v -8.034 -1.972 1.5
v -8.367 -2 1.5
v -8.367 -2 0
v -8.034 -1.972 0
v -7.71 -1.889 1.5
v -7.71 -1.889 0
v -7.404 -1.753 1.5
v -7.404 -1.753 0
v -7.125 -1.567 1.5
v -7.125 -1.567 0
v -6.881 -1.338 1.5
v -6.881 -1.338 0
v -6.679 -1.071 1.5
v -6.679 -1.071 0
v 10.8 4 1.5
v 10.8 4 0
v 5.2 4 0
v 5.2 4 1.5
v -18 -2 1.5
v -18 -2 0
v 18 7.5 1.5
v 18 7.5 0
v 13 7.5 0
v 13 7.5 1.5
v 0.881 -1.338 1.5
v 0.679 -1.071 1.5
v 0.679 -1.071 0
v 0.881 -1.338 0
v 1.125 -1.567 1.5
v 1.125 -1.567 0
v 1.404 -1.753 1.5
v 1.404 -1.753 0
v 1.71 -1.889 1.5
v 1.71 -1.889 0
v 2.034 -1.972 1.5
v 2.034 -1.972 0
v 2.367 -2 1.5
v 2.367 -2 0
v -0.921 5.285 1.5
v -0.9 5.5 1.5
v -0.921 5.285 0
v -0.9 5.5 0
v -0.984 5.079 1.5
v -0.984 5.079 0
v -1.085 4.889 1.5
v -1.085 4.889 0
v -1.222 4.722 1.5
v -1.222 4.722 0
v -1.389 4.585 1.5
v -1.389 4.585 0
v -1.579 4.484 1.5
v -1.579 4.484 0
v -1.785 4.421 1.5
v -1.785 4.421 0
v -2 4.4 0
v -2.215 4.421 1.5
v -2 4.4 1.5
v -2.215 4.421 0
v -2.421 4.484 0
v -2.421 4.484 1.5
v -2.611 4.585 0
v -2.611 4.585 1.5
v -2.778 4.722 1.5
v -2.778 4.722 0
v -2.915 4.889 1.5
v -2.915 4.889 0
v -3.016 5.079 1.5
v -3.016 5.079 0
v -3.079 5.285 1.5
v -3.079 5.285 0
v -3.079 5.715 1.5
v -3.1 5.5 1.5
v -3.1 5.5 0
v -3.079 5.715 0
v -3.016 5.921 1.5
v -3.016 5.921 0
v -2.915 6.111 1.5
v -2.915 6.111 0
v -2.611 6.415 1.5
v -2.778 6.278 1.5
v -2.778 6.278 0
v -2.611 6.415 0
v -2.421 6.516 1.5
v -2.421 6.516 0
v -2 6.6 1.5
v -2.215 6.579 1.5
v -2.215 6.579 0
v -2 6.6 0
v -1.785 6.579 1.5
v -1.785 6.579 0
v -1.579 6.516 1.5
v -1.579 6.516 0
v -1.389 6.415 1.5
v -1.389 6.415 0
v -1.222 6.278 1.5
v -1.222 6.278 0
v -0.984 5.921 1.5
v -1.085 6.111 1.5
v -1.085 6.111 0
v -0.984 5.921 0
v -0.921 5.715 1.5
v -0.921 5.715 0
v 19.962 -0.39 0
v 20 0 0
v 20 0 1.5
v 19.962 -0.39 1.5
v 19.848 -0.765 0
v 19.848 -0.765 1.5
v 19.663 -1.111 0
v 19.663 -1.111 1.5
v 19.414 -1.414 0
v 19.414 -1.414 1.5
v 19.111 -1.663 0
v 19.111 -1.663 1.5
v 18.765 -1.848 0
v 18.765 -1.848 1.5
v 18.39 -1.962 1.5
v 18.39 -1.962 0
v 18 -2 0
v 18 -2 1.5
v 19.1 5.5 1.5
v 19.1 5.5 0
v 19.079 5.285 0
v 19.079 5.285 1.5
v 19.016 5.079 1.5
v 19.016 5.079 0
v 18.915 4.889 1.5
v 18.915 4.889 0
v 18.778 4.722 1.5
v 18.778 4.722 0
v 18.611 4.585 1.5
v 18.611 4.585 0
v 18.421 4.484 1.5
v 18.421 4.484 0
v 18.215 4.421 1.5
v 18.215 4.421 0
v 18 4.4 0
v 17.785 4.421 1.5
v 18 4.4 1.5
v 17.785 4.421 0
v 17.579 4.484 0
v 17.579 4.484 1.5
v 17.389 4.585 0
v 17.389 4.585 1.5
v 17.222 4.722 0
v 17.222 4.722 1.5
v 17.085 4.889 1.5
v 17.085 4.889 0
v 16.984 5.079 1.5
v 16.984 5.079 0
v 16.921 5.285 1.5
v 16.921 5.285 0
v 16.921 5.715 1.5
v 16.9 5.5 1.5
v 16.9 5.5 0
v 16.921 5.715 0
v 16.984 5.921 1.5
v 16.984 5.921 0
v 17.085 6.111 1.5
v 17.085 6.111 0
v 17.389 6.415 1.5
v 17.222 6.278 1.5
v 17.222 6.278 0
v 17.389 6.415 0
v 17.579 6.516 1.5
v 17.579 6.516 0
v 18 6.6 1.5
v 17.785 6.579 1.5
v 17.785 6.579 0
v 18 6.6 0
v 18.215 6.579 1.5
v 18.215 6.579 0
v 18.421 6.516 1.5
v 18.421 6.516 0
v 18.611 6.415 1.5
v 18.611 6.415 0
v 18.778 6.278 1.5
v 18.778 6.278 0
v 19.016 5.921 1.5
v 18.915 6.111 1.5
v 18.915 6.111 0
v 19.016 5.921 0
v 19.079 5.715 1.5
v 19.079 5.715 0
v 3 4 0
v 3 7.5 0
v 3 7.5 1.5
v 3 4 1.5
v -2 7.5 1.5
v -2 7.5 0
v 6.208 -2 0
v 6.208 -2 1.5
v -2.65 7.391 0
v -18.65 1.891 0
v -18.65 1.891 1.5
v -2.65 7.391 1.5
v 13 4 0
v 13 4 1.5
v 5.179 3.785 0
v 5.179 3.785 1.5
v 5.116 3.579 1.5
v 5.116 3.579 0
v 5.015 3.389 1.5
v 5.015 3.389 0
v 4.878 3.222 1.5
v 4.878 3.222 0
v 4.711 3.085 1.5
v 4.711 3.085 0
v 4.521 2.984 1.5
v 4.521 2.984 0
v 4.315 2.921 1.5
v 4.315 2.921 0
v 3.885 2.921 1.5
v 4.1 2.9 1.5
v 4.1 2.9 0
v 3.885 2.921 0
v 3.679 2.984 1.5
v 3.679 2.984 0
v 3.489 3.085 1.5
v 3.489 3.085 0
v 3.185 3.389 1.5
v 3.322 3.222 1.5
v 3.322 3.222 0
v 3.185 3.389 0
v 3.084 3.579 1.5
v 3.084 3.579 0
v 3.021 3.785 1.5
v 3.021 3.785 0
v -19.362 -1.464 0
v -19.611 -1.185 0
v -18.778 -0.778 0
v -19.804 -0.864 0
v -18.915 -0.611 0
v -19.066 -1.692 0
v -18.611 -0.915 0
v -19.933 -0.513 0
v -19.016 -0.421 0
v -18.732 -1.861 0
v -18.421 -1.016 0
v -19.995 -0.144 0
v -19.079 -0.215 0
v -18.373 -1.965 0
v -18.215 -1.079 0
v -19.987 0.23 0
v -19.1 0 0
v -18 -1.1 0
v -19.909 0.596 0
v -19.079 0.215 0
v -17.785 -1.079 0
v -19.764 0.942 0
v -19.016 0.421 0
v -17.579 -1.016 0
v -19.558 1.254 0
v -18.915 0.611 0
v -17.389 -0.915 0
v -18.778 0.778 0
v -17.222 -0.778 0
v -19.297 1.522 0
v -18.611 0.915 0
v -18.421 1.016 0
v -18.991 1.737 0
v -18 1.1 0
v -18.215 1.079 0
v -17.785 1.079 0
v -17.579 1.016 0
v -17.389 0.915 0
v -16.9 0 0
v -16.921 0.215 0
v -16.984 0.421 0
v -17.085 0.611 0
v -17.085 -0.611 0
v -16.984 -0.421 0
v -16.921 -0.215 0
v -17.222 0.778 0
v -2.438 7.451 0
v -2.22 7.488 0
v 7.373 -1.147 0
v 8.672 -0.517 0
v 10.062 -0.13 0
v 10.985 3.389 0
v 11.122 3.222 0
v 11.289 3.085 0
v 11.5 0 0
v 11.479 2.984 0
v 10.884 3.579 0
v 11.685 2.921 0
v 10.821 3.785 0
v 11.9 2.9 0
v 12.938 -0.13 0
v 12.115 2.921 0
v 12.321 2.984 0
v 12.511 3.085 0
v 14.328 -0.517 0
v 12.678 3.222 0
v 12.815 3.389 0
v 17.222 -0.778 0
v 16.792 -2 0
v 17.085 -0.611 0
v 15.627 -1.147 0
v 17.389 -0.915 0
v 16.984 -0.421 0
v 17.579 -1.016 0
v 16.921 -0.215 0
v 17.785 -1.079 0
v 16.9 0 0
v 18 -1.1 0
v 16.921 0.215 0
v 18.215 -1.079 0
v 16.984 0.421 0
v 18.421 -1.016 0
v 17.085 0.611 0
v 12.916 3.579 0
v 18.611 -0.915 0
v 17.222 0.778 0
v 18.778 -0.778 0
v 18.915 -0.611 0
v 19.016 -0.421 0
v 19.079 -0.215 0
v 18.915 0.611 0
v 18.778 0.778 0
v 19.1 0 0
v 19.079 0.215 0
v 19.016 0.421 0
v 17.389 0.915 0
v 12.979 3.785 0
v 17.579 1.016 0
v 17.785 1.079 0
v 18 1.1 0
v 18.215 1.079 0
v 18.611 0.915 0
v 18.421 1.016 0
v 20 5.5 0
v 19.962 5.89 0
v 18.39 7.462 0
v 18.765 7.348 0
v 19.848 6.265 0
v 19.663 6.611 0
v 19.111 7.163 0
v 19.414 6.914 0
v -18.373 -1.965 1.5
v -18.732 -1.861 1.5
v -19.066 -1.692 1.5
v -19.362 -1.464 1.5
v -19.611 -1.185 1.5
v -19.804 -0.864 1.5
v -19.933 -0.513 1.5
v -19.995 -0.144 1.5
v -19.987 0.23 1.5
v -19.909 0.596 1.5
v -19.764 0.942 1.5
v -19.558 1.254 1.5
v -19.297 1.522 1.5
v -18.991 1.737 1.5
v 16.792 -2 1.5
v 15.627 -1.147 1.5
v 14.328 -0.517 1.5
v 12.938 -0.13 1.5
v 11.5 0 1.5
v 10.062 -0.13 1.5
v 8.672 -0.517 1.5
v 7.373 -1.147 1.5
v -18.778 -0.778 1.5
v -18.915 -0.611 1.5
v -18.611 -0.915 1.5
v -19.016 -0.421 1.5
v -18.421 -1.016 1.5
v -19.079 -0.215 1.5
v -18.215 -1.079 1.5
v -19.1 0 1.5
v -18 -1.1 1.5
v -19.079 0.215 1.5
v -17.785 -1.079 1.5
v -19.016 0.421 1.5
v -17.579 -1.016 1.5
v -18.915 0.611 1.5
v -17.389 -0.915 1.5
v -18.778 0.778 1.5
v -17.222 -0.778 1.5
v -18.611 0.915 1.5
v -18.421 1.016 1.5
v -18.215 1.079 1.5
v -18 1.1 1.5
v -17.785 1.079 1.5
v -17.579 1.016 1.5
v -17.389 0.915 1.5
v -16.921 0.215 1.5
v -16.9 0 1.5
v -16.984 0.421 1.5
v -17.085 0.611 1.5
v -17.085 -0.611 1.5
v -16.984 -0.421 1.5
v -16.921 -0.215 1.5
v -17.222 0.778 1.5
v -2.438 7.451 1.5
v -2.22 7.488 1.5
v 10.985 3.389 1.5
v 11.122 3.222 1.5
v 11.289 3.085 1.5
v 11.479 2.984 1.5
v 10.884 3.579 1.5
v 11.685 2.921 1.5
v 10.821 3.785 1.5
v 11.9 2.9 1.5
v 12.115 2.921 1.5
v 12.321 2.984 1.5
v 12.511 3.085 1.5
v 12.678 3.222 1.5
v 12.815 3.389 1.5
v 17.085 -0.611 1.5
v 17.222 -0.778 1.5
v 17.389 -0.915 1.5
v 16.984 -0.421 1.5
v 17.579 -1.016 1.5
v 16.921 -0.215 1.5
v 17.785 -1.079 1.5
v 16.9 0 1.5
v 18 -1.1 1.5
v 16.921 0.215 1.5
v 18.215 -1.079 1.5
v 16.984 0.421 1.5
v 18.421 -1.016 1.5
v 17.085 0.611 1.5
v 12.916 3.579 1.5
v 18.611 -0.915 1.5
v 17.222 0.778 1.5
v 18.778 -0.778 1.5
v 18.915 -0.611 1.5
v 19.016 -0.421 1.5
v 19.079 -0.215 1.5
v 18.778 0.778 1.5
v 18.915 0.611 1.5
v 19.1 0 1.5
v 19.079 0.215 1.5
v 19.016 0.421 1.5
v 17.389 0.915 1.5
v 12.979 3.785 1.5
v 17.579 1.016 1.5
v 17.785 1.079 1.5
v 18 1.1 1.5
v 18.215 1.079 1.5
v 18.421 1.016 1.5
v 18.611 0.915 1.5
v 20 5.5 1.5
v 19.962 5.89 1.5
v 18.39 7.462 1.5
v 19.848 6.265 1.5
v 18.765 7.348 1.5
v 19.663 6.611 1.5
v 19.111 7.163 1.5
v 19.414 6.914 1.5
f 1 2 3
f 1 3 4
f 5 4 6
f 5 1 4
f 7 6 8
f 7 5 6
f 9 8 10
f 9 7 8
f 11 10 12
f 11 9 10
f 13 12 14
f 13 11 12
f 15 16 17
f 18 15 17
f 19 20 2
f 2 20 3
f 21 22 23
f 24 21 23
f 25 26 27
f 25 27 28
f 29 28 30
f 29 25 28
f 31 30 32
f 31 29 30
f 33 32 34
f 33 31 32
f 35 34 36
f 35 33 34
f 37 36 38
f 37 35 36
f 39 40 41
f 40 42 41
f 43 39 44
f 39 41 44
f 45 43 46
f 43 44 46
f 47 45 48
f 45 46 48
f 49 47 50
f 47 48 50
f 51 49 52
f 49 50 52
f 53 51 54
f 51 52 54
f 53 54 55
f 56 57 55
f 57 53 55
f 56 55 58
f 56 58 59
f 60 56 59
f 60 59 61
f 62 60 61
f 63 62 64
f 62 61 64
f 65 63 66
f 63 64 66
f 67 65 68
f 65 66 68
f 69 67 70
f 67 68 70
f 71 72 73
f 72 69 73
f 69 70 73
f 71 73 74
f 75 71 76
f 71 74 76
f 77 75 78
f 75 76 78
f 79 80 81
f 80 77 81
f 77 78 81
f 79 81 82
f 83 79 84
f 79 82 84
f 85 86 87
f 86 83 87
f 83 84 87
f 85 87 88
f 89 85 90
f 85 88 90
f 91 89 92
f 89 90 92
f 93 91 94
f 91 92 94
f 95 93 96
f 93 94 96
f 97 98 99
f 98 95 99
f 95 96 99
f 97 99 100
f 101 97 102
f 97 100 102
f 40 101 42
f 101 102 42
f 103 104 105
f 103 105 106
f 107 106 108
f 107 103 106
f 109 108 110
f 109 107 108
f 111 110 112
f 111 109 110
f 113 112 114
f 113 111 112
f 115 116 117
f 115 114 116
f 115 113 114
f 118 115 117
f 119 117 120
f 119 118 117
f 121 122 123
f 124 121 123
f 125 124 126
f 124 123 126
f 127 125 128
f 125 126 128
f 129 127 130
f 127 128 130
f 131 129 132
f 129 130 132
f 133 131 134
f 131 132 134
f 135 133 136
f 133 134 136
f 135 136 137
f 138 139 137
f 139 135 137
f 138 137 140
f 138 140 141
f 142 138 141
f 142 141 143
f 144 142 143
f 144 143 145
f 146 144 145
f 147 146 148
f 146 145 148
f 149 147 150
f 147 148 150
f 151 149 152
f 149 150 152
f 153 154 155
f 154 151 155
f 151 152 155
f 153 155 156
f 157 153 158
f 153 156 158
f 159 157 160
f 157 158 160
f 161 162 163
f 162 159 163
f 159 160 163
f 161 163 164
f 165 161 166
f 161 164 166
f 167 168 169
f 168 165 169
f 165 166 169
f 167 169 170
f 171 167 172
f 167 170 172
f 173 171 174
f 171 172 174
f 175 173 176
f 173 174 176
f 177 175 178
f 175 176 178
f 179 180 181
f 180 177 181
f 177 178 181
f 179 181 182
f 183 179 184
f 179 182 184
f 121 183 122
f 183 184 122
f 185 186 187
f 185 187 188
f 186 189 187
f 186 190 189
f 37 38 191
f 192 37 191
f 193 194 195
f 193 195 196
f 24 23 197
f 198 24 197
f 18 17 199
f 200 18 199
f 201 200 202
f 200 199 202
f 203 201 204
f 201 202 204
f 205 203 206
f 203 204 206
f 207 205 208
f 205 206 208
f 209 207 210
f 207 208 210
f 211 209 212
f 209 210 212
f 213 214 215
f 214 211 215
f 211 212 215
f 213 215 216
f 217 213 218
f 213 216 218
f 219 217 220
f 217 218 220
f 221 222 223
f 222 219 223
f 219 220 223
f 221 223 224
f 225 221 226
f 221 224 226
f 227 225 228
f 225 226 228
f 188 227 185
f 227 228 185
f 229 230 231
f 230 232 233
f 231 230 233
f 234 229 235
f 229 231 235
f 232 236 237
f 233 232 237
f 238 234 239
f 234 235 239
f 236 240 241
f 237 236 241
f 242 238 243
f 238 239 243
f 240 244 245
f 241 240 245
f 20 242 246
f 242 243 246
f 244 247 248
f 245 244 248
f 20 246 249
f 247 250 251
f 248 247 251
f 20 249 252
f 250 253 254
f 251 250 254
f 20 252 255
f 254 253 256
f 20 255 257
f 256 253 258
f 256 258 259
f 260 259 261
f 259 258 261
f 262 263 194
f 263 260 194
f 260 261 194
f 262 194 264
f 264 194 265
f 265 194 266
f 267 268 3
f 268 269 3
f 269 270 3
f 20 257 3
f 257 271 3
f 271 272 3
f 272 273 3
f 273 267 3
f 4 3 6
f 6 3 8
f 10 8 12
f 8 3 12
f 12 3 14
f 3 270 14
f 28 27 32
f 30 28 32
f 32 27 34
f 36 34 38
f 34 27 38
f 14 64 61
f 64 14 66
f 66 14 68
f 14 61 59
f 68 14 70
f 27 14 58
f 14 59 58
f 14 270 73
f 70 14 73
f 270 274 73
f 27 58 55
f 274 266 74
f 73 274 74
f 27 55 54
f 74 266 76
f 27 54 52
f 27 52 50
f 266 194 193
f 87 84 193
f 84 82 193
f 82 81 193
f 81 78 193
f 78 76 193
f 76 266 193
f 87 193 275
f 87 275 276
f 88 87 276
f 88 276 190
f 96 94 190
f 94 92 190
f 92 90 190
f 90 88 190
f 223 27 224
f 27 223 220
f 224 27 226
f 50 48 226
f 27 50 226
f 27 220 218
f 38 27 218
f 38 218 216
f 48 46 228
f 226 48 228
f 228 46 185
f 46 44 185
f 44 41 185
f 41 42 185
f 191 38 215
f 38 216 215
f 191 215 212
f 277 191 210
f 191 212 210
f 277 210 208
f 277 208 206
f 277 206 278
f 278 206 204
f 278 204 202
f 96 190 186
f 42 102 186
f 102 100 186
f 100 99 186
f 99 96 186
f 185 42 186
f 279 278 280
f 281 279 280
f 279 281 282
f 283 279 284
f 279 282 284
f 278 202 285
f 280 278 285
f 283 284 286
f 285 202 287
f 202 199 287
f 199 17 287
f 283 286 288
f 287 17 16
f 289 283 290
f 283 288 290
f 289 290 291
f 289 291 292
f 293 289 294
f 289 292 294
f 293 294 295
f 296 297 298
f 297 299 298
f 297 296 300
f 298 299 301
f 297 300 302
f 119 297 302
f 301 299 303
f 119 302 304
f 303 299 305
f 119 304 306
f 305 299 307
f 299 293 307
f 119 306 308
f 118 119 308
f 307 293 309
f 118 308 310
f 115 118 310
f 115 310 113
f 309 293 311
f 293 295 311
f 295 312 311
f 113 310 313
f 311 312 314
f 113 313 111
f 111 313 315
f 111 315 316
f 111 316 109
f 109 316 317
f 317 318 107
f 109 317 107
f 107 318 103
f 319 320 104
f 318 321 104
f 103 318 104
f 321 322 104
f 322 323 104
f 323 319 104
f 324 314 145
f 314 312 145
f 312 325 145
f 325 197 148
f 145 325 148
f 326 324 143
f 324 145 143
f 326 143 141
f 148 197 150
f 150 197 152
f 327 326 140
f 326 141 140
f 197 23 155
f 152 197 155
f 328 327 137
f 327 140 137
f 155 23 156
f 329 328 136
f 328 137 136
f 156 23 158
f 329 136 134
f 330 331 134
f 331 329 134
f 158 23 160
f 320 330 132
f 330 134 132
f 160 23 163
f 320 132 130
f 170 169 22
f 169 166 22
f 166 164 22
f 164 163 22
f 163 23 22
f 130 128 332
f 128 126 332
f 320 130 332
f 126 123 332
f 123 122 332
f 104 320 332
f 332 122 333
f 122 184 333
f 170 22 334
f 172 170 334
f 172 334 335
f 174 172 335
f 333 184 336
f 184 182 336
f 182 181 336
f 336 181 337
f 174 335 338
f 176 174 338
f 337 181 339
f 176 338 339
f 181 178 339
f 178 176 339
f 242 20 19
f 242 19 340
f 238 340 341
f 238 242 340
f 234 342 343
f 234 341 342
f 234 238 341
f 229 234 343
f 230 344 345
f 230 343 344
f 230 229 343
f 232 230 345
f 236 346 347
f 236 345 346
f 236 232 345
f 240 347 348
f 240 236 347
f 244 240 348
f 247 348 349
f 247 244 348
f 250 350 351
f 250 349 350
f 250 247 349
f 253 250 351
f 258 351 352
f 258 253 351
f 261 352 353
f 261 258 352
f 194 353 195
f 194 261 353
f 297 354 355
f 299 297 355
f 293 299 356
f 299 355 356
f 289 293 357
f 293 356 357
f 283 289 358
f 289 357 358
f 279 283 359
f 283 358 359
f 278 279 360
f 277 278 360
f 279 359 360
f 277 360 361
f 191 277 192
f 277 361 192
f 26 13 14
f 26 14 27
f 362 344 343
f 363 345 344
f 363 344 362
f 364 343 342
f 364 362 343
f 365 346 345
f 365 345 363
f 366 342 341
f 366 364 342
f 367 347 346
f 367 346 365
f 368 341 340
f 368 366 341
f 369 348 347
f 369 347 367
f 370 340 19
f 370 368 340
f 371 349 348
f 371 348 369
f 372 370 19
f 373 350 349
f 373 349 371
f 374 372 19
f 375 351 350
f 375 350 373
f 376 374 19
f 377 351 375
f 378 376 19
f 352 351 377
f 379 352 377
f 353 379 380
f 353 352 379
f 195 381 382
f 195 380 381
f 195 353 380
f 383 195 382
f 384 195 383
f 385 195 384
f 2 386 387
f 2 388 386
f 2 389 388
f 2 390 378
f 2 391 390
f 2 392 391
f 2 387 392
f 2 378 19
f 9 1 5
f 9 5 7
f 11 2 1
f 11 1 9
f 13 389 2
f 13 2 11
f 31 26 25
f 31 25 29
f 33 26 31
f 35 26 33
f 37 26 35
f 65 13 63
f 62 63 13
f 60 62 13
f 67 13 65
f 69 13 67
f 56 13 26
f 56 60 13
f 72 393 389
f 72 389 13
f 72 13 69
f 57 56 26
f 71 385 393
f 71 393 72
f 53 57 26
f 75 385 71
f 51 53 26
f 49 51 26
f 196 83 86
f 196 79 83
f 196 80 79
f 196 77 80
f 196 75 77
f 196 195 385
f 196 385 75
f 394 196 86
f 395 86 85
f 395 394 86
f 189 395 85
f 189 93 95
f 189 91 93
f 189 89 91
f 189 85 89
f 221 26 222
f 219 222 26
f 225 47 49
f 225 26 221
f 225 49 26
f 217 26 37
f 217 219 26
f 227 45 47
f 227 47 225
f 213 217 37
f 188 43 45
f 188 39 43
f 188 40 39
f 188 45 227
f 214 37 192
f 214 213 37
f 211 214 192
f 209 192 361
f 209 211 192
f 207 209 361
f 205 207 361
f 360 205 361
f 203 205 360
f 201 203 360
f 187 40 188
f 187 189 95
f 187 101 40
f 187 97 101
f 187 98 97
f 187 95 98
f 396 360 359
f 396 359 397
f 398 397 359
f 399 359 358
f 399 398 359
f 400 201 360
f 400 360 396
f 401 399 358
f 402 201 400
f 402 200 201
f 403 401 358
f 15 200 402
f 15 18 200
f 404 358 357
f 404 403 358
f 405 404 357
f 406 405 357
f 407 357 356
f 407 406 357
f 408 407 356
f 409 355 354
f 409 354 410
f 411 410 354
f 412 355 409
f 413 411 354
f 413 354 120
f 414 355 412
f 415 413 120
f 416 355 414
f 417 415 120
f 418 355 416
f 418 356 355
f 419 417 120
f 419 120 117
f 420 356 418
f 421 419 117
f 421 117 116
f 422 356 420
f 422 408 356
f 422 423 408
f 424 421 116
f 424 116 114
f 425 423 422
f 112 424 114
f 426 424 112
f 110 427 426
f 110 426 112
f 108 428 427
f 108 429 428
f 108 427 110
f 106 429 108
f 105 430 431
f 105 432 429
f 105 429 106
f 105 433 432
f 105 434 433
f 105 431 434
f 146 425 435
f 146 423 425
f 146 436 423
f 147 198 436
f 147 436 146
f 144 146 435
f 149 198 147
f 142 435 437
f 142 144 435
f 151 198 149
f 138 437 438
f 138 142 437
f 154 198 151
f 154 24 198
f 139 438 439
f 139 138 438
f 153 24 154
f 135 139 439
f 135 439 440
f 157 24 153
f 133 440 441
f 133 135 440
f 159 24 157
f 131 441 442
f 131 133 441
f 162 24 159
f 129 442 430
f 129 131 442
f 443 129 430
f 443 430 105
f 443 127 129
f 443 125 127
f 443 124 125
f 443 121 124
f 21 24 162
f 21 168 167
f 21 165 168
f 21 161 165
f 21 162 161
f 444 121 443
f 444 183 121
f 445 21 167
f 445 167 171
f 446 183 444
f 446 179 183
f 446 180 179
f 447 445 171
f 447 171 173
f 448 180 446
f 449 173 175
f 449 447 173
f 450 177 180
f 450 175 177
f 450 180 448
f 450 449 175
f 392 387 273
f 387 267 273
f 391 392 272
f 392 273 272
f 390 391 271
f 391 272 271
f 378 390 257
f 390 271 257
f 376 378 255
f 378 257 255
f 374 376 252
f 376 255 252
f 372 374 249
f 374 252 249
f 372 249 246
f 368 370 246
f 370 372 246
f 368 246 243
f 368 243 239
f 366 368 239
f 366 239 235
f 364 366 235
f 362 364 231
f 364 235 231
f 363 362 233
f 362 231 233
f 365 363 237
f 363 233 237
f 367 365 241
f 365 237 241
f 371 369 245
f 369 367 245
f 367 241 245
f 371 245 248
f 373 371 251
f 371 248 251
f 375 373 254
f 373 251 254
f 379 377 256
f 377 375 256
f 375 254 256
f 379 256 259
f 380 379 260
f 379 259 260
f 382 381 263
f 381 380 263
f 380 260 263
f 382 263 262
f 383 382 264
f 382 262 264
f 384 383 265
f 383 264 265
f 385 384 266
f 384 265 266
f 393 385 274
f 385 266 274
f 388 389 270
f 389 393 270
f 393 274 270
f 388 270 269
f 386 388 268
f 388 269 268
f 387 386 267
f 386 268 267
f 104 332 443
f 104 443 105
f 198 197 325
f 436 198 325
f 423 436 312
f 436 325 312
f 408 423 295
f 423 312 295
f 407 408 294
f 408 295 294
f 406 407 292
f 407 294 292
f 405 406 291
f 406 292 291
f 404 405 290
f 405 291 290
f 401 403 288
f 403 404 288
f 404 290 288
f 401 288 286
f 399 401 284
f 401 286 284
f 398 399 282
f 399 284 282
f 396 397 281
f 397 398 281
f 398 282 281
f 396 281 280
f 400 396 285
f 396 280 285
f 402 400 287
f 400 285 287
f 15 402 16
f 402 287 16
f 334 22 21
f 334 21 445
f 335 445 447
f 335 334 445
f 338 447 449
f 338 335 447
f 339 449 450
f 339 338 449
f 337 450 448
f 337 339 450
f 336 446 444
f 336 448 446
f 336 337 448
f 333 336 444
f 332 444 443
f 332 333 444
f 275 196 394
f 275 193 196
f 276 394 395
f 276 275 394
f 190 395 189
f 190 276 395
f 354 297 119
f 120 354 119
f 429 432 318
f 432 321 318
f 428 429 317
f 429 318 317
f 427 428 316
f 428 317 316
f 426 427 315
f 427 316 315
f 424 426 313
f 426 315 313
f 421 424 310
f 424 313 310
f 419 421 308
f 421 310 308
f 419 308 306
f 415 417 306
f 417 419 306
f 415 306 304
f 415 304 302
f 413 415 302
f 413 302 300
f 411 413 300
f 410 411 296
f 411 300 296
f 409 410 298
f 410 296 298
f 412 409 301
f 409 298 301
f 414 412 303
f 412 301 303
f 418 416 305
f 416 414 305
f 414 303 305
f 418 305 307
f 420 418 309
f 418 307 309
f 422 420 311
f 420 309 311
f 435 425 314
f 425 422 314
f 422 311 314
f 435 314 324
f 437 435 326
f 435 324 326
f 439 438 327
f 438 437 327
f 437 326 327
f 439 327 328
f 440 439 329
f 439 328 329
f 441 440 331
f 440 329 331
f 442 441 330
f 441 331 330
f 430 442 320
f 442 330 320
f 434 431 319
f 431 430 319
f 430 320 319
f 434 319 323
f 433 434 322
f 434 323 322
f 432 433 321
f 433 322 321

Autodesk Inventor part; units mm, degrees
ref_plane "YZ Plane" through (0, 0, 0) normal (1, 0, 0) x (0, 1, 0)
ref_plane "XZ Plane" through (0, 0, 0) normal (0, 1, 0) x (-1, 0, 0)
ref_plane "XY Plane" through (0, 0, 0) normal (0, 0, 1) x (1, 0, 0)
sketch "スケッチ1" plane through (0, 0, 0) normal (0, 0, 1) x (1, 0, 0)
  circle A0 centre (-18, 0) radius 1.1
  circle A1 centre (18, 0) radius 1.1
  circle A2 centre (-18, 0) radius 2
  circle A3 centre (18, 0) radius 2
  line L0 (3, 7) -> (13, 7)
  line L1 (13, 7) -> (13, 4)
  line L2 (13, 4) -> (3, 4)
  line L3 (3, 4) -> (3, 7)
  circle A4 centre (4.1, 4) radius 1.1
  line L4 (8, 7) -> (8, 3.6941) construction
  circle A5 centre (11.9, 4) radius 1.1
  circle A6 centre (18, 5.5) radius 1.1
  circle A7 centre (-2, 5.5) radius 1.1
  circle A8 centre (-2, 5.5) radius 2
  circle A9 centre (18, 5.5) radius 2
  line L5 (-18.6502, 1.8914) -> (-2.6502, 7.3914)
  line L6 (-2, 7.5) -> (3, 7.5)
  line L7 (3, 7.5) -> (3, 7)
  line L8 (20, 5.5) -> (20, 0)
  line L9 (-18, -2) -> (18, -2)
  line L10 (18, 7.5) -> (13, 7.5)
  line L11 (13, 7.5) -> (13, 7)
  point P0 (0, 0)
  point P1 (13, 5.5)
  point P2 (10.8, 4)
  point P3 (5.2, 4)
  dimension "d0" = 2.2
  dimension "d1" = 2.2
  dimension "d2" = 36
  dimension "d3" = 18
  dimension "d4" = 4
  dimension "d5" = 4
  dimension "d6" = 3
  dimension "d7" = 10
  dimension "d8" = 2.2
  dimension "d9" = 2.2
  dimension "d10" = 5
  dimension "d11" = 4
  dimension "d12" = 4
  dimension "d13" = 4
extrude "押し出し1" add sketch "スケッチ1" along normal blind 1.5 contours A2 | A2 L5 A8 L6 L7 L3 A4 L2 A5 L1 L11 L10 A9 L8 A3 L9 | A8 | A3 | A9
sketch "スケッチ3" plane through (0, 0, 1.5) normal (0, 0, 1) x (1, 0, 0)
  circle A0 centre (11.5, -8) radius 8 projected
  line L0 (-6.1786, -1.5714) -> (-6.1786, -5.4286) projected
  line L1 (0.1786, -1.5714) -> (-6.1786, -1.5714) projected
  line L2 (0.1786, -5.4286) -> (0.1786, -1.5714) projected
  line L3 (-18, -2) -> (18, -2) projected
  line L4 (-6.6786, -5.4286) -> (-6.6786, -1.0714)
  line L5 (-6.6786, -1.0714) -> (0.6786, -1.0714)
  line L6 (0.6786, -1.0714) -> (0.6786, -5.4286)
  point P0 (0, 0)
  point P1 (3.6112, -2)
  point P2 (0.6786, -2)
  point P3 (-6.6786, -2)
  dimension "d22" = 0.5
extrude "押し出し3" cut sketch "スケッチ3" against normal through all
fillet "フィレット2" radius 2 2 edges at (0.6786, -2, 0.75) (-6.6786, -2, 0.75)
equation "\"d3\" = 0.5 * d2"
equation "\"d12\" = d11"
properties part number "kosiyosetuzoku"
